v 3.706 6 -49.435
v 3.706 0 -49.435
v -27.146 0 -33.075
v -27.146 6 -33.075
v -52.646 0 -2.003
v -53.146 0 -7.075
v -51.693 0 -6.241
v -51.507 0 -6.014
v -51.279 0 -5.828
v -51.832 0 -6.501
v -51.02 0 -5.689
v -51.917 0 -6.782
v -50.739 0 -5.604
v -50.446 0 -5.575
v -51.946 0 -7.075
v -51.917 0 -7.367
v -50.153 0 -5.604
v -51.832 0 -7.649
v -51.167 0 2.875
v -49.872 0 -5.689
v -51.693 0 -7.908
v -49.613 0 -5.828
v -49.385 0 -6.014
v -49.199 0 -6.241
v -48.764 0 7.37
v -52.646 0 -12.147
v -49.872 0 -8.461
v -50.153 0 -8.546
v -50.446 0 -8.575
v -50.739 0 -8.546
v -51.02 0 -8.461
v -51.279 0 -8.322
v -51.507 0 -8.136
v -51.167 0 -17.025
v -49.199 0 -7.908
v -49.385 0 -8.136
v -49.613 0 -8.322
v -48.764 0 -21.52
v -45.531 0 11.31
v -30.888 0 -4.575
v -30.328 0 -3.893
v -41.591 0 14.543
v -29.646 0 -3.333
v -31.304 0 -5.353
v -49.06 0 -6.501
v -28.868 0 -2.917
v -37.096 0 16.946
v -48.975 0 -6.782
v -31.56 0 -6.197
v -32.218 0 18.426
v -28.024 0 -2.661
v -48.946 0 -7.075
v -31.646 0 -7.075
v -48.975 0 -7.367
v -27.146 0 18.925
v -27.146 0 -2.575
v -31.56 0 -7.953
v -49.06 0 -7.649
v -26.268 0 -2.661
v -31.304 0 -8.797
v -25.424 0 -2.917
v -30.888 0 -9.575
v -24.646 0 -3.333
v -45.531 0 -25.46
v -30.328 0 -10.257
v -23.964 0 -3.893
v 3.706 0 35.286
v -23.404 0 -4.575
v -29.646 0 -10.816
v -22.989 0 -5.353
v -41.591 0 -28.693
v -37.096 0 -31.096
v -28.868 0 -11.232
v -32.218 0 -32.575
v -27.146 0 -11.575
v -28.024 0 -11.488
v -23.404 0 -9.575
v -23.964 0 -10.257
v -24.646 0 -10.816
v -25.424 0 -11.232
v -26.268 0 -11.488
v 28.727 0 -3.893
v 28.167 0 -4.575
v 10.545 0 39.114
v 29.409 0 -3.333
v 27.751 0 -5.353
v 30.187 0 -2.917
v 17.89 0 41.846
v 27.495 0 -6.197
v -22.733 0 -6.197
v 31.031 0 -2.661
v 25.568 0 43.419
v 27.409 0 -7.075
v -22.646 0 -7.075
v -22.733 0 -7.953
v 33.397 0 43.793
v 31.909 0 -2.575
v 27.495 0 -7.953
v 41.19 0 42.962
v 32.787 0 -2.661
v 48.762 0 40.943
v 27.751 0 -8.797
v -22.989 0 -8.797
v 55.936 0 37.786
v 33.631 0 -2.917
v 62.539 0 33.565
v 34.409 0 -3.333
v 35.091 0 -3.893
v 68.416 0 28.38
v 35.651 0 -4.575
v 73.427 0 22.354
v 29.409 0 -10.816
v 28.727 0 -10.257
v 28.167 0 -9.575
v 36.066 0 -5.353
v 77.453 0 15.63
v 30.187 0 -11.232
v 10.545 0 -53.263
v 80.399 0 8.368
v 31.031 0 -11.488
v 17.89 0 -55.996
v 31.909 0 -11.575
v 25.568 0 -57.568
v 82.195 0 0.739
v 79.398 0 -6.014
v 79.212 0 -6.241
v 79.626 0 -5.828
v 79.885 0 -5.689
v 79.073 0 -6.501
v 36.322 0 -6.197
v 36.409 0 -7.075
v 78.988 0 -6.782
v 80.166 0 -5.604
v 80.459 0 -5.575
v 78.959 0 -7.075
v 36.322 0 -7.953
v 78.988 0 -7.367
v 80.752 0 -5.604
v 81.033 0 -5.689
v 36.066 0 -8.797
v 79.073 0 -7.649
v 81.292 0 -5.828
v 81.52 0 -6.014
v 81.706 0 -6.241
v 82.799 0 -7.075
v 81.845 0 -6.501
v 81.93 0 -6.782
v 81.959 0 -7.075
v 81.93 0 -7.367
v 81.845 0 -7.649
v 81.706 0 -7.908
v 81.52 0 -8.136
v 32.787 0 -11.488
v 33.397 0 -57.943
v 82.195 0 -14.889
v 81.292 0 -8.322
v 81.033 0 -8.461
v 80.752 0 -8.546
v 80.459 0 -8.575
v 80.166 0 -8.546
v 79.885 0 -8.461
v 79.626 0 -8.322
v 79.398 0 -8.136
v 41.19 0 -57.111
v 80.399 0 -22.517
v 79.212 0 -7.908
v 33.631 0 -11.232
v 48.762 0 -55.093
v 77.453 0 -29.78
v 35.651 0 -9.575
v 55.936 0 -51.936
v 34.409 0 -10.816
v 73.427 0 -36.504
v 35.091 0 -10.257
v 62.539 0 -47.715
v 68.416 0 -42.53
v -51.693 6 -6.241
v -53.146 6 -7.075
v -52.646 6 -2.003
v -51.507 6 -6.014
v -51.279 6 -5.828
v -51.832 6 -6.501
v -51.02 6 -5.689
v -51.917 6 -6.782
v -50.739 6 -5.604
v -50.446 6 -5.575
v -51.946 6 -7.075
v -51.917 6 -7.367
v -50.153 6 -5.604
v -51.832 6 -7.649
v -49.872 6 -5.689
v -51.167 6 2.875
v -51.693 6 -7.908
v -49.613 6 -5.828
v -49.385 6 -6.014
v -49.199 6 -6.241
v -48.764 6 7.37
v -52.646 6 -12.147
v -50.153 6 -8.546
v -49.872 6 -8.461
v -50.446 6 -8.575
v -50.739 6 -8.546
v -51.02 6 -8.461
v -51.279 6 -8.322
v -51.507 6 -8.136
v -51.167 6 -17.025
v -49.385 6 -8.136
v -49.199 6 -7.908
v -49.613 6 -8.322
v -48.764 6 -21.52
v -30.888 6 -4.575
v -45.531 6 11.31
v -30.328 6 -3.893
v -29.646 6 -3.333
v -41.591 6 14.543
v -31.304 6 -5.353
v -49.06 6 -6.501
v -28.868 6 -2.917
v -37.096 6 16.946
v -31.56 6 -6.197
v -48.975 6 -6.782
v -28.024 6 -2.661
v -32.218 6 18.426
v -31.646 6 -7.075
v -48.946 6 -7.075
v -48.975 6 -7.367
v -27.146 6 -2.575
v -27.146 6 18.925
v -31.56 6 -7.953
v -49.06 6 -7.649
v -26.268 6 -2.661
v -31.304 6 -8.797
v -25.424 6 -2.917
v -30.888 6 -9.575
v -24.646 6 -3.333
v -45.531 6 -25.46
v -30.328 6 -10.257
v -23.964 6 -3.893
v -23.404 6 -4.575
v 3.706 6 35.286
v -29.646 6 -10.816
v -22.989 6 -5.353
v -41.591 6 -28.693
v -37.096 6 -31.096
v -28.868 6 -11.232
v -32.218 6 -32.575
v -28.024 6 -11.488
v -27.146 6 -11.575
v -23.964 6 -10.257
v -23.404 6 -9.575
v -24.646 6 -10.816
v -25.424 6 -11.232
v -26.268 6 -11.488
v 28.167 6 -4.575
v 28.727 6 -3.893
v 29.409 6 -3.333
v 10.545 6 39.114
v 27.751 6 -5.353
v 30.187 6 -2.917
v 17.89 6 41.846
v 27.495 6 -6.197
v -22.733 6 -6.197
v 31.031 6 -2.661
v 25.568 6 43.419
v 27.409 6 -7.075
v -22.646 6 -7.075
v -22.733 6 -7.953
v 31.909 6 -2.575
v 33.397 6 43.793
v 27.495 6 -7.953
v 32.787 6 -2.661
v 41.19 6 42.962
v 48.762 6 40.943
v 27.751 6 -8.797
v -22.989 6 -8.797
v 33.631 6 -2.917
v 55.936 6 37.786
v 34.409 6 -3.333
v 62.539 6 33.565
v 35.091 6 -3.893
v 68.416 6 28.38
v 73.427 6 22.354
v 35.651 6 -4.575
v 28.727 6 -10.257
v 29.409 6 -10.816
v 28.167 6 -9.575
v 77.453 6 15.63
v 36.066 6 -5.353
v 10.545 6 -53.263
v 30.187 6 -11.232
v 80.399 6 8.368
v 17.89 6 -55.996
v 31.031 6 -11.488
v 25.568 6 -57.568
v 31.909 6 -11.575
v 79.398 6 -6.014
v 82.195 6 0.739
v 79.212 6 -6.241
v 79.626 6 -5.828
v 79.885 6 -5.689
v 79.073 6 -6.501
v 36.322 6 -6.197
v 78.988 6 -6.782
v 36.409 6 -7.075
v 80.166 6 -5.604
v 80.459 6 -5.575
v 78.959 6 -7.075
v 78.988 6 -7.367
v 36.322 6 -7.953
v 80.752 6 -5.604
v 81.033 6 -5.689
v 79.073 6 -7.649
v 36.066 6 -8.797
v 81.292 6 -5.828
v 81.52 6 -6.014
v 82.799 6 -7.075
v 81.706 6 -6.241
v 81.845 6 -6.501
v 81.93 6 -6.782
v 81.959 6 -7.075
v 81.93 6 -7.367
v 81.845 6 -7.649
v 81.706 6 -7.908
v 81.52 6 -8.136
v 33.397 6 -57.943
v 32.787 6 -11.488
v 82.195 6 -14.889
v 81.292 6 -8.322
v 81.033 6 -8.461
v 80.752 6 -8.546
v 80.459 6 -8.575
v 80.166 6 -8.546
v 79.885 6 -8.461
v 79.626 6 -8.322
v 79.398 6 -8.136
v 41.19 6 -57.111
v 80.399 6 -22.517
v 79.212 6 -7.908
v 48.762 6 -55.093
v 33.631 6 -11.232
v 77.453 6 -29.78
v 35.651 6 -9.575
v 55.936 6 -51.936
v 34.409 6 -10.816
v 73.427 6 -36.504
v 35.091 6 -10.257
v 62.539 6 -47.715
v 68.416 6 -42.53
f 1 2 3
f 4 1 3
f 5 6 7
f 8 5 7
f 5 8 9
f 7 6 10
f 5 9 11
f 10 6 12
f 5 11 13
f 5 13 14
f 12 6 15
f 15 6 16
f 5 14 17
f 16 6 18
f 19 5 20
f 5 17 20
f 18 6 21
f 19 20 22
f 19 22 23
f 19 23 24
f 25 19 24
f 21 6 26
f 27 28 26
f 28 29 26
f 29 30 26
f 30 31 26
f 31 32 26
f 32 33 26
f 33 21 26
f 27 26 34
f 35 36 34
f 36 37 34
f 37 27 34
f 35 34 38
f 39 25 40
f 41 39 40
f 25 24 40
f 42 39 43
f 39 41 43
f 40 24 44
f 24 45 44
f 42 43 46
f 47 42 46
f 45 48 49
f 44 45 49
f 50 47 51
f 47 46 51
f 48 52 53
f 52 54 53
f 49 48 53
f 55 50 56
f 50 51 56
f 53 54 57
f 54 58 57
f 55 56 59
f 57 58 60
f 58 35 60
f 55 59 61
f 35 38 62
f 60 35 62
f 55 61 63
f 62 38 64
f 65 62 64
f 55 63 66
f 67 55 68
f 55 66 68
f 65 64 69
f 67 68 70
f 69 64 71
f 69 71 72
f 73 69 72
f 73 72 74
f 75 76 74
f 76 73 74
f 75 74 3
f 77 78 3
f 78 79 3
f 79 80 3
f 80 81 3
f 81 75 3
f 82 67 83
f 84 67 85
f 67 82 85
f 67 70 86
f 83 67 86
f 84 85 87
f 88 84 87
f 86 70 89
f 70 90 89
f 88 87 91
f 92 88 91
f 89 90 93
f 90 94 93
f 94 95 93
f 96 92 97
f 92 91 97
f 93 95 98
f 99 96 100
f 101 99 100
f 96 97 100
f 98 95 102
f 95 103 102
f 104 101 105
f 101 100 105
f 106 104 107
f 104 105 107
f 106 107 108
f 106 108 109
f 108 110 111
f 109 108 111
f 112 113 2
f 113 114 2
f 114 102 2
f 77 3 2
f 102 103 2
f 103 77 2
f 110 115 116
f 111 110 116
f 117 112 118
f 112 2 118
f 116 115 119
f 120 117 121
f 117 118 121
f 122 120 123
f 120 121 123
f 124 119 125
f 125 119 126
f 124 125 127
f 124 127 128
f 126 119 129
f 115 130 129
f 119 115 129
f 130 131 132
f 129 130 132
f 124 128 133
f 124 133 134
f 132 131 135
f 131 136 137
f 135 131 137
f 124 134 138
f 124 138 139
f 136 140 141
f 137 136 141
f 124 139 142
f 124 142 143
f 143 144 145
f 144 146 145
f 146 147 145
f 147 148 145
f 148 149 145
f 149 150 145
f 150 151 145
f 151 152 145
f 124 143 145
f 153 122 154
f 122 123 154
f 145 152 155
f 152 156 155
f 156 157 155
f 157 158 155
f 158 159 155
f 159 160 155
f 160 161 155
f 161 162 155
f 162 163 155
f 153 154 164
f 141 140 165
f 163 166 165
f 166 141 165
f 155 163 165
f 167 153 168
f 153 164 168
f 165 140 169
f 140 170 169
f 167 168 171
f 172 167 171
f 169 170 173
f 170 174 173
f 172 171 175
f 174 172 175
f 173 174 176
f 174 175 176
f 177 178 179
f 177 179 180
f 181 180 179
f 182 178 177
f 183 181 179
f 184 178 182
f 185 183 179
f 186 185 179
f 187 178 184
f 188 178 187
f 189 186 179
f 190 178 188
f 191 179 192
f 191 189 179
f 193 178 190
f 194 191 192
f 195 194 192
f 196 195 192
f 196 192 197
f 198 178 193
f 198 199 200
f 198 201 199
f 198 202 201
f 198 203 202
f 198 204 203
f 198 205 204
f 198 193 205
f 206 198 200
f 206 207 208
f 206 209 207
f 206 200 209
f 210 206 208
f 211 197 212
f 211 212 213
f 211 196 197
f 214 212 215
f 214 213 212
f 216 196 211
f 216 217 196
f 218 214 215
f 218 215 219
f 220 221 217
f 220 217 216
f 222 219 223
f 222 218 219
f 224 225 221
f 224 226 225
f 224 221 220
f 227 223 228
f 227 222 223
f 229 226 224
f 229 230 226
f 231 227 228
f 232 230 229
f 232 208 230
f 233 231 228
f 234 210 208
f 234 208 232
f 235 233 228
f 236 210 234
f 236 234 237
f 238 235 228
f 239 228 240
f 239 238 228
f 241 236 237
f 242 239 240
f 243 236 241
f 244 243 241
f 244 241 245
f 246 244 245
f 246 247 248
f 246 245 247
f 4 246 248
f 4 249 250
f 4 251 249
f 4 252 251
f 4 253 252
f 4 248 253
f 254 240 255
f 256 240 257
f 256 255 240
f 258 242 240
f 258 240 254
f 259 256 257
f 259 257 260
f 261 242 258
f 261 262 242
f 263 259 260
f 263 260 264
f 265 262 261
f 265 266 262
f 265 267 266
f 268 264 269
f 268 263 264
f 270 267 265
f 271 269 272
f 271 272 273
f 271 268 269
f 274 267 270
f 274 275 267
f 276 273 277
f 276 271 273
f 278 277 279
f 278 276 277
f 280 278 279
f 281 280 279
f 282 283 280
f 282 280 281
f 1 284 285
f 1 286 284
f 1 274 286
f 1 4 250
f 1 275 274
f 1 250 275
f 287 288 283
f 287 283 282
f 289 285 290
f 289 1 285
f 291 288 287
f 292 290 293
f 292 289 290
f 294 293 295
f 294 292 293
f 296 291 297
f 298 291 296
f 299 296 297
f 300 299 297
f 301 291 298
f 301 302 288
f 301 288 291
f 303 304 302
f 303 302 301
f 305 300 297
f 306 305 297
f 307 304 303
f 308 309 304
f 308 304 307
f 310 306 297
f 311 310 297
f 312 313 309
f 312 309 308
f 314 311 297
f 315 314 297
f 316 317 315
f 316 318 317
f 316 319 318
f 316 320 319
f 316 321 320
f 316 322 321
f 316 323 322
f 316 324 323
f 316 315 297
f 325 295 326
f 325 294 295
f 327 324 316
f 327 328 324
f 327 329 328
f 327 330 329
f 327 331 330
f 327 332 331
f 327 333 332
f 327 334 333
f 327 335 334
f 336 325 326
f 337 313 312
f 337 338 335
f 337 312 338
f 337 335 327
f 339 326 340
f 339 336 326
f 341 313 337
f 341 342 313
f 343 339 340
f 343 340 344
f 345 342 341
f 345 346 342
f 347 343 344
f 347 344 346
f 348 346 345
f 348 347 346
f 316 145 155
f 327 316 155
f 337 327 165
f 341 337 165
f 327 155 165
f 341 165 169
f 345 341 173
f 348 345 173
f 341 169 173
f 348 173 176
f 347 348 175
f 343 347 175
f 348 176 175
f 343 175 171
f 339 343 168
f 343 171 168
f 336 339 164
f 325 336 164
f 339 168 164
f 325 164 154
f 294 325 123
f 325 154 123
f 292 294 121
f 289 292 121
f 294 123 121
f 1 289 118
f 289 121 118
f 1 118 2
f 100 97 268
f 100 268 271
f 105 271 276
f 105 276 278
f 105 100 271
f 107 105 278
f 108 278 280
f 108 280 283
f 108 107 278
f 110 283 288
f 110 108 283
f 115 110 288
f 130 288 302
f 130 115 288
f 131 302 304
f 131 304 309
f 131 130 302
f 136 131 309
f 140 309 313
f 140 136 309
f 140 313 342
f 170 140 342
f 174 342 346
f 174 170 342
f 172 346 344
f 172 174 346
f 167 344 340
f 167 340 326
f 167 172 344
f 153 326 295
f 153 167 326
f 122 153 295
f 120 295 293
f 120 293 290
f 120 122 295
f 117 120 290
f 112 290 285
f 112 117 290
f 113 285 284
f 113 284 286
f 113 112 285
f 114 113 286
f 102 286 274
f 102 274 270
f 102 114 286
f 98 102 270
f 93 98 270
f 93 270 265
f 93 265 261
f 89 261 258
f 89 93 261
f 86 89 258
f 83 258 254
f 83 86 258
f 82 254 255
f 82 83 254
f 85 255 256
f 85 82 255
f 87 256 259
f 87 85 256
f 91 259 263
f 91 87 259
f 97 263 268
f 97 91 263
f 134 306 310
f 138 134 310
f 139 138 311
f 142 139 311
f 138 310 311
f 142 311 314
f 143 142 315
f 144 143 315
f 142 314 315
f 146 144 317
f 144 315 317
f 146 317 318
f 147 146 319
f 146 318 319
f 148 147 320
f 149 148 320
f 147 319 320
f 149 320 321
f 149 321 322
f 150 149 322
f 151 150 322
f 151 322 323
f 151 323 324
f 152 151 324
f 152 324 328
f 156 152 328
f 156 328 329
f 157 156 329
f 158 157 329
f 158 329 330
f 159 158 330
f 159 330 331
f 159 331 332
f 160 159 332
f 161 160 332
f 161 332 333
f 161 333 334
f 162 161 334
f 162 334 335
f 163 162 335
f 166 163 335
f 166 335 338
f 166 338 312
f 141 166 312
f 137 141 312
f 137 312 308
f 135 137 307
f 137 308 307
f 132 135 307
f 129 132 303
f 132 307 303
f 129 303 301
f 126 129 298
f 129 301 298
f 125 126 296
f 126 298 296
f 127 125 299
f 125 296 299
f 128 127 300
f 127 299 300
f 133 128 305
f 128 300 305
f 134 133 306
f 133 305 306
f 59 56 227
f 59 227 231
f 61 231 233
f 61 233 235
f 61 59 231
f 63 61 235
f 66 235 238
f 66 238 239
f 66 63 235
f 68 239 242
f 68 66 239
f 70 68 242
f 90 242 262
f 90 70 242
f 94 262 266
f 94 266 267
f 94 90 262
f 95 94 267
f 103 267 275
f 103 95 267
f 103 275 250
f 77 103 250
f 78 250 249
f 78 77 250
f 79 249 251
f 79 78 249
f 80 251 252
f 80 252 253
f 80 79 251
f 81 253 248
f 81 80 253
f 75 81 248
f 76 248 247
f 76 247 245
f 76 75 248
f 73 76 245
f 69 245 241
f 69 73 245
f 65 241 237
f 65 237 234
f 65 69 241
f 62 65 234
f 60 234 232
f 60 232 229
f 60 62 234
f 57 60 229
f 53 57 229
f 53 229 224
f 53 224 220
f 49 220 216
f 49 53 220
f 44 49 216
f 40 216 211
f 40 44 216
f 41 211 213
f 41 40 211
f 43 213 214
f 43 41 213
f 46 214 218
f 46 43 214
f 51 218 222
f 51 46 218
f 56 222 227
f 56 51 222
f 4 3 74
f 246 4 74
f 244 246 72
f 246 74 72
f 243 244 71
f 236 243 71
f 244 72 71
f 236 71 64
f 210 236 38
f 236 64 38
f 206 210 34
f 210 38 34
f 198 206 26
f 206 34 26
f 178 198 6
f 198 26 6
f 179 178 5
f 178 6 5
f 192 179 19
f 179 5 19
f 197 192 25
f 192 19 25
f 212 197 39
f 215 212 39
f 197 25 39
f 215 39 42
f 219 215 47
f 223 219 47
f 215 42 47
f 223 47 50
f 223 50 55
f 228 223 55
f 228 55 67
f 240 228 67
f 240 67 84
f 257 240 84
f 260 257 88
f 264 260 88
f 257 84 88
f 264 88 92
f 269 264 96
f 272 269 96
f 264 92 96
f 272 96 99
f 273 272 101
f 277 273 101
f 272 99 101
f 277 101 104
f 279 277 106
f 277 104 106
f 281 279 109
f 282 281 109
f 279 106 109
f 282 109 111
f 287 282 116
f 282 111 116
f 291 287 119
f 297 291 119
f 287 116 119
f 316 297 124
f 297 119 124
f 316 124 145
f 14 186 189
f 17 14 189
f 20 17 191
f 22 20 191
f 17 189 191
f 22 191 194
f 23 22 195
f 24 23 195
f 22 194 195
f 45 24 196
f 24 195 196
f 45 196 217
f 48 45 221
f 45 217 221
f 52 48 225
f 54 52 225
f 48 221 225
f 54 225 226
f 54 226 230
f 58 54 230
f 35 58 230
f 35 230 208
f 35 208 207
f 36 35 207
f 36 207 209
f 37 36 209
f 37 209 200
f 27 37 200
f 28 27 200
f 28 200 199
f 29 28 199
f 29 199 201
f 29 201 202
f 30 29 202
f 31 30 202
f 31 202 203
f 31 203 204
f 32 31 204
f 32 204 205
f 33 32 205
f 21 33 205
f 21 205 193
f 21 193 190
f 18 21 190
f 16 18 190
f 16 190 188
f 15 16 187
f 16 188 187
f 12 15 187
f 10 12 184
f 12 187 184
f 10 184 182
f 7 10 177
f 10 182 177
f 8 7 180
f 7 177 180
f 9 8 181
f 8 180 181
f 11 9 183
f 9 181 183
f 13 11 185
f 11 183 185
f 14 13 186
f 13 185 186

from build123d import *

# Parameters (mm, degrees)
SKETCH1_R           = 4.5
SKETCH1_R_2         = 44.53
BOSS_EXTRUDE1_DEPTH = 6
SKETCH2_R           = 1.5
CUT_EXTRUDE1_DEPTH  = 10


with BuildPart() as part:
    # Sketch1 → Boss-Extrude1 (new body)
    # profile 1 of 7: a face of its own
    with BuildSketch(Plane(origin=(0, 0, 0), x_dir=(1, 0, 0), z_dir=(0, 1, 0))):
        with BuildLine():
            Line((3.706249193, 49.435224426), (-27.146075319, 33.07485149))
            ThreePointArc((-27.146075319, 33.07485149), (-53.146075319, 7.07485149), (-27.146075319, -18.92514851))
            Line((-27.146075319, -18.92514851), (3.706249193, -35.285521446))
            ThreePointArc((3.706249193, -35.285521446), (-4.027102695, -28.958383674), (-10.375107984, -21.242151909))
            Line((-10.375107984, -21.242151909), (-27.146075319, -13.92514851))
            ThreePointArc((-27.146075319, -13.92514851), (-48.146075319, 7.07485149), (-27.146075319, 28.07485149))
            Line((-27.146075319, 28.07485149), (-9.910194417, 36.074047649))
            ThreePointArc((-9.910194417, 36.074047649), (-3.73365085, 43.398382562), (3.706249193, 49.435224426))
        make_face()
    # profile 2 of 7: a face of its own
    with BuildSketch(Plane(origin=(0, 0, 0), x_dir=(1, 0, 0), z_dir=(0, 1, 0))):
        with BuildLine():
            ThreePointArc((-10.375107984, -21.242151909), (-18.97940126, 7.487626122), (-9.910194417, 36.074047649))
            Line((-9.910194417, 36.074047649), (-27.146075319, 28.07485149))
            ThreePointArc((-27.146075319, 28.07485149), (-48.146075319, 7.07485149), (-27.146075319, -13.92514851))
            Line((-27.146075319, -13.92514851), (-10.375107984, -21.242151909))
        make_face()
        with Locations(Location((-27.146075319, 7.07485149, 0), (0, 0, 270))):
            Circle(SKETCH1_R, mode=Mode.SUBTRACT)
    # profile 3 of 7: a face of its own
    with BuildSketch(Plane(origin=(0, 0, 0), x_dir=(1, 0, 0), z_dir=(0, 1, 0))):
        with BuildLine():
            ThreePointArc((82.798924681, 7.07485149), (55.935555161, 51.935893919), (3.706249193, 49.435224426))
            ThreePointArc((3.706249193, 49.435224426), (-3.73365085, 43.398382562), (-9.910194417, 36.074047649))
            Line((-9.910194417, 36.074047649), (6.70287652, 43.784196842))
            ThreePointArc((6.70287652, 43.784196842), (52.651339866, 46.478824796), (76.438924681, 7.07485149))
            ThreePointArc((76.438924681, 7.07485149), (50.975331795, -33.166831126), (3.706249193, -27.385705604))
            Line((3.706249193, -27.385705604), (-10.375107984, -21.242151909))
            ThreePointArc((-10.375107984, -21.242151909), (-4.027102695, -28.958383674), (3.706249193, -35.285521446))
            ThreePointArc((3.706249193, -35.285521446), (55.935555161, -37.786190939), (82.798924681, 7.07485149))
        make_face()
    # profile 4 of 7: a face of its own
    with BuildSketch(Plane(origin=(0, 0, 0), x_dir=(1, 0, 0), z_dir=(0, 1, 0))):
        with BuildLine():
            Line((6.70287652, 43.784196842), (-9.910194417, 36.074047649))
            ThreePointArc((-9.910194417, 36.074047649), (-18.97940126, 7.487626122), (-10.375107984, -21.242151909))
            Line((-10.375107984, -21.242151909), (3.706249193, -27.385705604))
            ThreePointArc((3.706249193, -27.385705604), (-12.581655153, 8.948138973), (6.70287652, 43.784196842))
        make_face()
    # profile 5 of 7: a face of its own
    with BuildSketch(Plane(origin=(0, 0, 0), x_dir=(1, 0, 0), z_dir=(0, 1, 0))):
        with BuildLine():
            ThreePointArc((82.798924681, 7.07485149), (55.935555161, 51.935893919), (3.706249193, 49.435224426))
            ThreePointArc((3.706249193, 49.435224426), (-3.73365085, 43.398382562), (-9.910194417, 36.074047649))
            Line((-9.910194417, 36.074047649), (6.70287652, 43.784196842))
            ThreePointArc((6.70287652, 43.784196842), (52.651339866, 46.478824796), (76.438924681, 7.07485149))
            ThreePointArc((76.438924681, 7.07485149), (50.975331795, -33.166831126), (3.706249193, -27.385705604))
            Line((3.706249193, -27.385705604), (-10.375107984, -21.242151909))
            ThreePointArc((-10.375107984, -21.242151909), (-4.027102695, -28.958383674), (3.706249193, -35.285521446))
            ThreePointArc((3.706249193, -35.285521446), (55.935555161, -37.786190939), (82.798924681, 7.07485149))
        make_face()
    # profile 6 of 7: a face of its own
    with BuildSketch(Plane(origin=(0, 0, 0), x_dir=(1, 0, 0), z_dir=(0, 1, 0))):
        with BuildLine():
            Line((6.70287652, 43.784196842), (-9.910194417, 36.074047649))
            ThreePointArc((-9.910194417, 36.074047649), (-18.97940126, 7.487626122), (-10.375107984, -21.242151909))
            Line((-10.375107984, -21.242151909), (3.706249193, -27.385705604))
            ThreePointArc((3.706249193, -27.385705604), (-12.581655153, 8.948138973), (6.70287652, 43.784196842))
        make_face()
    # profile 7 of 7: a face of its own
    with BuildSketch(Plane(origin=(0, 0, 0), x_dir=(1, 0, 0), z_dir=(0, 1, 0))):
        with Locations((31.908924681, 7.07485149)):
            Circle(SKETCH1_R_2)
        with Locations(Location((31.908924681, 7.07485149, 0), (0, 0, 270))):
            Circle(SKETCH1_R, mode=Mode.SUBTRACT)
    extrude(amount=BOSS_EXTRUDE1_DEPTH)

    # Sketch2 → Cut-Extrude1 (cut)
    with BuildSketch(Plane(origin=(0, 6, 0), x_dir=(1, 0, 0), z_dir=(0, 1, 0))):
        with Locations(Location((-50.446075319, 7.07485149, 0), (0, 0, 270))):
            Circle(SKETCH2_R)
        with Locations(Location((80.458924681, 7.07485149, 0), (0, 0, 270))):
            Circle(SKETCH2_R)
    extrude(amount=-CUT_EXTRUDE1_DEPTH, mode=Mode.SUBTRACT)


solid = part.part
